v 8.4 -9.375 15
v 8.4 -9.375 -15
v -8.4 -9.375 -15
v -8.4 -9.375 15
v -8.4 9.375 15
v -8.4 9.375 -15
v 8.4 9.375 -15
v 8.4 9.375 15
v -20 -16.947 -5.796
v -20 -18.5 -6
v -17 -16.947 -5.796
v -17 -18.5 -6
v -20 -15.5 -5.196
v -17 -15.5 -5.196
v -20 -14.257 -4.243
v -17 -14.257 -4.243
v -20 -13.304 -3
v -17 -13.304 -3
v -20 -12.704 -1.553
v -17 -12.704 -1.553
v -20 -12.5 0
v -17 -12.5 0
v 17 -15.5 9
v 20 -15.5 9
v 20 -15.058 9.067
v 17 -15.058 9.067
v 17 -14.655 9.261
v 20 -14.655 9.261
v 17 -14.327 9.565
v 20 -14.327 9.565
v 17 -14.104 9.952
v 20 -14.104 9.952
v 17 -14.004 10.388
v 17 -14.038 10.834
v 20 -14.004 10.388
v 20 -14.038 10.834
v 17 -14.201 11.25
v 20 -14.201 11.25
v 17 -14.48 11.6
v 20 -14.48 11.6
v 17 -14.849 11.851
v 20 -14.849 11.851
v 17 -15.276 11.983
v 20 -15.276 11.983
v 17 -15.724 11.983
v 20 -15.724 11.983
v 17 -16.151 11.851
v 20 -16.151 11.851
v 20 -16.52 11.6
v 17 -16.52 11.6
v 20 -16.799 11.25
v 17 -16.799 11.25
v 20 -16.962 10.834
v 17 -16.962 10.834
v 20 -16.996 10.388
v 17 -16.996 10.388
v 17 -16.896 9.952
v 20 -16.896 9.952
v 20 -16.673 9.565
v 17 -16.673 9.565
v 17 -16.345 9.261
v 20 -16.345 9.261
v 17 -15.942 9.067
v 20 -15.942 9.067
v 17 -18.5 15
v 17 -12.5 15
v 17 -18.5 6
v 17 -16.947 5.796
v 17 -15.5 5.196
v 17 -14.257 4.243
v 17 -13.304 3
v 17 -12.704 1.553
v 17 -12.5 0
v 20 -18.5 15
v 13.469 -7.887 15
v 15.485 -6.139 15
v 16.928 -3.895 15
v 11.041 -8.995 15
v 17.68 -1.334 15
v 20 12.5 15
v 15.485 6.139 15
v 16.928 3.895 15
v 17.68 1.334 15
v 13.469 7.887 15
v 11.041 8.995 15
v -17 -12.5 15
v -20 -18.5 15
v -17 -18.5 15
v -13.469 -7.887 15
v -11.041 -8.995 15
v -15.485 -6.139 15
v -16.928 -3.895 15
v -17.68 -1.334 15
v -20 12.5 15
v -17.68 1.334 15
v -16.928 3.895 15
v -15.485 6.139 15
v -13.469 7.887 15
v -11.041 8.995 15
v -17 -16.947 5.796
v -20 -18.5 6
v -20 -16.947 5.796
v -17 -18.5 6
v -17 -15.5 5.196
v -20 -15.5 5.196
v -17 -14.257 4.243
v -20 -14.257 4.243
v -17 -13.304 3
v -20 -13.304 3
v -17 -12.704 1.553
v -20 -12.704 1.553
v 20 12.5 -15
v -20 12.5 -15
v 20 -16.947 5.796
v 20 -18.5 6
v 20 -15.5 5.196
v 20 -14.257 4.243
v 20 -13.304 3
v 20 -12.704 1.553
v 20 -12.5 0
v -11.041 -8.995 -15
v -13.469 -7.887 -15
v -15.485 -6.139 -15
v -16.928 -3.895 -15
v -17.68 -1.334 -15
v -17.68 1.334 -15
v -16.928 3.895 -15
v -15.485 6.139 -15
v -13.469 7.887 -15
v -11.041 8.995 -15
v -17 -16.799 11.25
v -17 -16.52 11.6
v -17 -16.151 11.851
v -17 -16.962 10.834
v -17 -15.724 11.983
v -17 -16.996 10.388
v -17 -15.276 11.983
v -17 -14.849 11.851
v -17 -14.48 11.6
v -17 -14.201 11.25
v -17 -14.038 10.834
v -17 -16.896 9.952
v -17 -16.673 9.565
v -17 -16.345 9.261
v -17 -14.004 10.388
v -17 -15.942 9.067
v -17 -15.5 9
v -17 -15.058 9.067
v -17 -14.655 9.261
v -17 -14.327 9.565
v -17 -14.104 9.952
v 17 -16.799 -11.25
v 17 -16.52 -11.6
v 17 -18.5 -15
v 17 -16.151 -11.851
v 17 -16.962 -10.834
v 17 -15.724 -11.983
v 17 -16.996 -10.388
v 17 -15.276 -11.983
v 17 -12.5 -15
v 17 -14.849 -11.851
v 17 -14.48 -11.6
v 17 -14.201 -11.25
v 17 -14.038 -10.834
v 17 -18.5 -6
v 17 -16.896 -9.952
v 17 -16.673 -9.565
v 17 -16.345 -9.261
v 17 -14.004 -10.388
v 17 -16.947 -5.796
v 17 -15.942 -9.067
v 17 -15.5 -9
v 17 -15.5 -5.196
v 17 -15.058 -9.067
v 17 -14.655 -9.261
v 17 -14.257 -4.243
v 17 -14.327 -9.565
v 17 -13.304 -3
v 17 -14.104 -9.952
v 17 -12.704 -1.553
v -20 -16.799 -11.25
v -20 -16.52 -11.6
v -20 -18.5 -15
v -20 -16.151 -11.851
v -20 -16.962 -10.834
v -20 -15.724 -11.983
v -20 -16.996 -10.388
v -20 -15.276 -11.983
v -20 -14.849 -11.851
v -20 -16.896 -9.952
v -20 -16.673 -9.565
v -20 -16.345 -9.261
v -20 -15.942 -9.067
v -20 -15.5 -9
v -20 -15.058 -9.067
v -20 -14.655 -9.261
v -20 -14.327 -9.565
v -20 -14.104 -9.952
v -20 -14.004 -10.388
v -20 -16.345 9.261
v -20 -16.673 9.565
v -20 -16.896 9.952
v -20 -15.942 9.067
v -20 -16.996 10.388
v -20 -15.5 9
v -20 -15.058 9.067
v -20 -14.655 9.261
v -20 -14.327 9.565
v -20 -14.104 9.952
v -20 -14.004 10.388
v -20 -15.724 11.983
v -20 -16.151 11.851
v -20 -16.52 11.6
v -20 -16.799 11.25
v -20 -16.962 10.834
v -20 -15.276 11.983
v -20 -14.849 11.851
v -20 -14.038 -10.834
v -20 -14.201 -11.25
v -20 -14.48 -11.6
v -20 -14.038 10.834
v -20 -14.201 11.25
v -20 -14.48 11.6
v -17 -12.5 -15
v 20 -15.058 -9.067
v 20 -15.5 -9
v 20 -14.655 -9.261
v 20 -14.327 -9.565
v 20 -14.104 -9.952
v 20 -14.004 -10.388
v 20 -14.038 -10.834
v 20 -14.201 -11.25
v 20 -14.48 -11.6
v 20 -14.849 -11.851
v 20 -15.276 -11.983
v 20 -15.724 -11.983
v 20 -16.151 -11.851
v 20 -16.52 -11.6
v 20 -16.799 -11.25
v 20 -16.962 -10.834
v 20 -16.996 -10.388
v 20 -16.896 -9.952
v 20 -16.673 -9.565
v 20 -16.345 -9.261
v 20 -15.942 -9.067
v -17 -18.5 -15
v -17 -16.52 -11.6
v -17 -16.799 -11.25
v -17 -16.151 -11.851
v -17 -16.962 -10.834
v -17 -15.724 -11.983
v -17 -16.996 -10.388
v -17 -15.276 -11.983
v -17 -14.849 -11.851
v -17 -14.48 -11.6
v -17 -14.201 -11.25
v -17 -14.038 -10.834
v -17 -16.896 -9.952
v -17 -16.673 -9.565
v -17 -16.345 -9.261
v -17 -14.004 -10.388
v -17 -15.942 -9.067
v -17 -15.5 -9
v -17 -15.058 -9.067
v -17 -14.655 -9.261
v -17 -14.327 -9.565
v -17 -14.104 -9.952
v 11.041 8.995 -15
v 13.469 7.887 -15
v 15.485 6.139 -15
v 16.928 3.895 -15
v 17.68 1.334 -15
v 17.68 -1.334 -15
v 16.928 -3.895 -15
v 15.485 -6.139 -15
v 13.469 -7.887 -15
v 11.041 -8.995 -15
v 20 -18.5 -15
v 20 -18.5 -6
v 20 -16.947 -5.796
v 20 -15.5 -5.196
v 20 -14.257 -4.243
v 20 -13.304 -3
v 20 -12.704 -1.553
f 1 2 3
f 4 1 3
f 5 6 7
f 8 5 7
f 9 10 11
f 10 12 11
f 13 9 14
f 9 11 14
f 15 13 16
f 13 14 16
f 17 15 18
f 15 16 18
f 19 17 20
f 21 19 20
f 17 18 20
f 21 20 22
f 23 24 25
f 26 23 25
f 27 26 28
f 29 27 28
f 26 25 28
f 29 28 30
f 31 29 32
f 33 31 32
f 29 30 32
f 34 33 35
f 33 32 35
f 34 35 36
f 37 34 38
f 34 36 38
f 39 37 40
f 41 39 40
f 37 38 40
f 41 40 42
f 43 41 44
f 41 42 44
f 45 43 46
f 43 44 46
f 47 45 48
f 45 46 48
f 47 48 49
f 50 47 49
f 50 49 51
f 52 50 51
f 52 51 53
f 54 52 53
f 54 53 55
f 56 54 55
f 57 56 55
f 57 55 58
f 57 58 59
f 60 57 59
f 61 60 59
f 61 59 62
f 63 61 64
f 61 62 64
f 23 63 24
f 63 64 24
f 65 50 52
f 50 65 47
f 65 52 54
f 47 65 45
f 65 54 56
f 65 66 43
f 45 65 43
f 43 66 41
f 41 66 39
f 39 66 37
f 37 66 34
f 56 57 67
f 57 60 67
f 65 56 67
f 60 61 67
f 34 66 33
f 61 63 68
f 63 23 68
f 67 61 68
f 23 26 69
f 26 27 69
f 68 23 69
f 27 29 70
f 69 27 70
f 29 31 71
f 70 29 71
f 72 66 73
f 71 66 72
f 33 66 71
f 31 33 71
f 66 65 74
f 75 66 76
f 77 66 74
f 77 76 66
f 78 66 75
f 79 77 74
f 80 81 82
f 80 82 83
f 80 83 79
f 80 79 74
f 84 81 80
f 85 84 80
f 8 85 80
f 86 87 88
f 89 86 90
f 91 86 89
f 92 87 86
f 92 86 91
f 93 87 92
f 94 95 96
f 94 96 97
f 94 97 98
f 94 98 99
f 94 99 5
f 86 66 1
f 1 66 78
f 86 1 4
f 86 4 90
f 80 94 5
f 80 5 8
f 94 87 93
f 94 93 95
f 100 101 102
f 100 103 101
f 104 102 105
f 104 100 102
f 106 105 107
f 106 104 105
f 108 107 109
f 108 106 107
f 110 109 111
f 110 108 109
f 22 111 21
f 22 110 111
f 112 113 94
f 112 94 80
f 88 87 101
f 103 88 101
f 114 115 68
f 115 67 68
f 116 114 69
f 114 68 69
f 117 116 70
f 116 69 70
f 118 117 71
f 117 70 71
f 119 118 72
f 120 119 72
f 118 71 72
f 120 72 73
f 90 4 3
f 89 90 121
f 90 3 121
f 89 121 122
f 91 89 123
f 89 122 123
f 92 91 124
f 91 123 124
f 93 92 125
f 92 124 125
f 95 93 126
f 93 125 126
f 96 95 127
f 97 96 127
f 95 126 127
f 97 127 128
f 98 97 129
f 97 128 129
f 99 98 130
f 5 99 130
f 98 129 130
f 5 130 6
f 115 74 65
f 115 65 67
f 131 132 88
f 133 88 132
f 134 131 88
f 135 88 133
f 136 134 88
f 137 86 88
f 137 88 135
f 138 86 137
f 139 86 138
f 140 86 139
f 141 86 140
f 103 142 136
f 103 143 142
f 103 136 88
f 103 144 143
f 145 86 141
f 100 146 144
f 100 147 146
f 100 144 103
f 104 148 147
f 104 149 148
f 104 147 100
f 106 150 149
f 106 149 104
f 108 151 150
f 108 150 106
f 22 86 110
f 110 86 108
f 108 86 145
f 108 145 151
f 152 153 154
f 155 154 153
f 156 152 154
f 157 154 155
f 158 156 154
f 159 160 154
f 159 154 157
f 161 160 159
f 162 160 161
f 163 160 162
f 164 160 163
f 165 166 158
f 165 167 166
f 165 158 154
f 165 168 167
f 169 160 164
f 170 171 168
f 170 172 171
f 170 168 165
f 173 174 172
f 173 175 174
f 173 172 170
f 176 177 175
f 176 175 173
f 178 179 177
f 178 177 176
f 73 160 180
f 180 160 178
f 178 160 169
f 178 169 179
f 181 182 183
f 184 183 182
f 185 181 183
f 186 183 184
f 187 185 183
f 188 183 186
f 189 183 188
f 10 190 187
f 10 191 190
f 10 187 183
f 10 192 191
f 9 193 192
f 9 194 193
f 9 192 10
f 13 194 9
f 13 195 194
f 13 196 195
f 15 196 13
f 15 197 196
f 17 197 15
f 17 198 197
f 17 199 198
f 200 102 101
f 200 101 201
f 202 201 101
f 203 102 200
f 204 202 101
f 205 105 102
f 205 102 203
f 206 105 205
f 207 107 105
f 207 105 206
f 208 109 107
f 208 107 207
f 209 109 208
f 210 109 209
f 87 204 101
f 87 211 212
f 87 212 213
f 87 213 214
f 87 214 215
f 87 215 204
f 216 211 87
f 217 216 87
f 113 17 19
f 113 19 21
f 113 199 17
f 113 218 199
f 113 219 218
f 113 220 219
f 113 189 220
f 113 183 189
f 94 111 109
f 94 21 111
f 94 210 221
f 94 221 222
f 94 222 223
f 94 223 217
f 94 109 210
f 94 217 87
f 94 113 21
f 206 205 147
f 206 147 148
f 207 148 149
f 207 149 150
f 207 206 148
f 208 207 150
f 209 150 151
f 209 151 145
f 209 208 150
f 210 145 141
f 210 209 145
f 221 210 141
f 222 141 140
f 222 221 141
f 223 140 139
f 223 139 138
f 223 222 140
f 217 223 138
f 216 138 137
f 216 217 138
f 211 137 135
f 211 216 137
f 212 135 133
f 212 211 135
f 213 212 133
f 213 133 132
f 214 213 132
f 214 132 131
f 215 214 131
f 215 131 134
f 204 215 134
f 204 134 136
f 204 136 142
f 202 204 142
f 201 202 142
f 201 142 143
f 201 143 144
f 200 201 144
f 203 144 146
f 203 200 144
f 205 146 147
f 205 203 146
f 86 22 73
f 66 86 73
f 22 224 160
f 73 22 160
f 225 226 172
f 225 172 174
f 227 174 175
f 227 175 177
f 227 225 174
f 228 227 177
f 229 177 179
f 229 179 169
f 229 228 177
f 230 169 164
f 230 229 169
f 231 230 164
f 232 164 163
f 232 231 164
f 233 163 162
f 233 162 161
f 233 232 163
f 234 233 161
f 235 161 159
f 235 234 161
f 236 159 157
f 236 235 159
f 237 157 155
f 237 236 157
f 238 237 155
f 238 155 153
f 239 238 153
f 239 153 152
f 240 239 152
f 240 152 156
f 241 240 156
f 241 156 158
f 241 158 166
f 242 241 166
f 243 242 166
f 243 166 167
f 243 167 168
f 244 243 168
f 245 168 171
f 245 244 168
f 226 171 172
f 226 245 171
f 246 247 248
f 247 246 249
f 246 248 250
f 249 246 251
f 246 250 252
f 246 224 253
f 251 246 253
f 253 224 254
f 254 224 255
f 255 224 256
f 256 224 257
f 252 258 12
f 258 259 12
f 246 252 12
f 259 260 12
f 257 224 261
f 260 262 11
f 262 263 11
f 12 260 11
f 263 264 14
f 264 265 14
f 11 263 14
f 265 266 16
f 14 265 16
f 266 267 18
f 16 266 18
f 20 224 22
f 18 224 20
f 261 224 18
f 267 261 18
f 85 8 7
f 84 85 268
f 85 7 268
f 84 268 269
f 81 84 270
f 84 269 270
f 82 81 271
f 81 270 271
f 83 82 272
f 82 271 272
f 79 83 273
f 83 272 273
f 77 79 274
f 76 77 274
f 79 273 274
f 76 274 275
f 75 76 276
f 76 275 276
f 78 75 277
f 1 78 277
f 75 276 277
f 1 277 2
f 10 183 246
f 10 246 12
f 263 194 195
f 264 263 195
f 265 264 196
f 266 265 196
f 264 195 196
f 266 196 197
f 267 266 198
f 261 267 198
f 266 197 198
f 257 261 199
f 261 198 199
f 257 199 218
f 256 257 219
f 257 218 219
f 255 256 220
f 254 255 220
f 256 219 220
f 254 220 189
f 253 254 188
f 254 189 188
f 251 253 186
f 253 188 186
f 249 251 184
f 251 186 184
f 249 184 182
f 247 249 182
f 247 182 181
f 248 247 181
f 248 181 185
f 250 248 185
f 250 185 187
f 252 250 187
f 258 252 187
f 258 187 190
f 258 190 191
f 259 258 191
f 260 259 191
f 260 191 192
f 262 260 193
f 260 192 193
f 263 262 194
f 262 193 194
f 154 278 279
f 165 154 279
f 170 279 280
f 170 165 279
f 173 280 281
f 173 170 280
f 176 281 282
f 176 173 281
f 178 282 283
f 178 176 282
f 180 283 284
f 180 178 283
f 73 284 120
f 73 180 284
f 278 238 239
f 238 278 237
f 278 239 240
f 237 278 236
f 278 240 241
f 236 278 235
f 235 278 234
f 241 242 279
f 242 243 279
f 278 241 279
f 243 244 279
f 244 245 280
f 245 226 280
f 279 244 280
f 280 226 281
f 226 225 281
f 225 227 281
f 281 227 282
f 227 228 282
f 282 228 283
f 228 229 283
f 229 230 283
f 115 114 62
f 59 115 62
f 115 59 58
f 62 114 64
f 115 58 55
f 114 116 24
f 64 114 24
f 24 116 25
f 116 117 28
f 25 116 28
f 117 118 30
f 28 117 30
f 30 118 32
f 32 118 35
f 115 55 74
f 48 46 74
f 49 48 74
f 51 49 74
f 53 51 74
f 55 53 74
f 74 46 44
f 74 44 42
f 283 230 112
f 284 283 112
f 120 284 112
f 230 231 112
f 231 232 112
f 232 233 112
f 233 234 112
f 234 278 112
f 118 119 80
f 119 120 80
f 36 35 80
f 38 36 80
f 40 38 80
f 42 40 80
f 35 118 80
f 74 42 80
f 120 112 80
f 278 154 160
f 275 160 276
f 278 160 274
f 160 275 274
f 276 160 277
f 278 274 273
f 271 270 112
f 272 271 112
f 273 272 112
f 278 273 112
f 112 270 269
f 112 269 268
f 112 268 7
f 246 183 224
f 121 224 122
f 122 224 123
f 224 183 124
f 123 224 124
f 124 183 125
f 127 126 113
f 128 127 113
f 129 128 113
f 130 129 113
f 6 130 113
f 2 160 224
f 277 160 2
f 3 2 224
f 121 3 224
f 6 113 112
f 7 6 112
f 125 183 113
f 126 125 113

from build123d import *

# Parameters (mm, degrees)
BOSS_EXTRUDE1_DEPTH      = 15
BOSS_EXTRUDE1_DEPTH_BACK = 15
SKETCH1_W                = 40
SKETCH1_H                = 25
SKETCH2_W                = 9
SKETCH2_H                = 6
SKETCH2_R                = 1.5
BOSS_EXTRUDE2_DEPTH      = 3
MIRROR3_COPY_1_SKETCH_W  = 9
MIRROR3_COPY_1_SKETCH_H  = 6
MIRROR3_COPY_1_SKETCH_R  = 1.5
MIRROR3_COPY_1_DEPTH     = 3
FILLET1_R                = 6


with BuildPart() as part:
    # Sketch1 → Boss-Extrude1 (new, two sides: drawn at the far end of the back side and taken through both)
    with BuildSketch(Plane.XY.offset(-BOSS_EXTRUDE1_DEPTH_BACK)):
        Rectangle(SKETCH1_W, SKETCH1_H)
        with BuildLine():
            Line((-8.4, 9.375), (8.4, 9.375))
            ThreePointArc((8.4, 9.375), (17.775, 0), (8.4, -9.375))
            Line((8.4, -9.375), (-8.4, -9.375))
            ThreePointArc((-8.4, -9.375), (-17.775, 0), (-8.4, 9.375))
        make_face(mode=Mode.SUBTRACT)
    extrude(amount=BOSS_EXTRUDE1_DEPTH + BOSS_EXTRUDE1_DEPTH_BACK)

    # Sketch2 → Boss-Extrude2 (add)
    with BuildSketch(Plane(origin=(20, 0, 0), x_dir=(0, 0, -1), z_dir=(1, 0, 0))):
        with Locations((-10.5, -15.5)):
            Rectangle(SKETCH2_W, SKETCH2_H)
        with Locations((-10.5, -15.5)):
            Circle(SKETCH2_R, mode=Mode.SUBTRACT)
    boss_extrude2 = extrude(amount=-BOSS_EXTRUDE2_DEPTH)

    # Mirror1: Boss-Extrude2 across plane
    add(boss_extrude2.mirror(Plane.XY))

    # Mirror3: Boss-Extrude2 across plane
    add(boss_extrude2.mirror(Plane(origin=(0, 0, 0), x_dir=(0, 0, 1), z_dir=(1, 0, 0))))

    # Mirror3 copy 1 sketch → Mirror3 copy 1 (add)
    with BuildSketch(Plane.ZY.offset(20)):
        with Locations((-10.5, -15.5)):
            Rectangle(MIRROR3_COPY_1_SKETCH_W, MIRROR3_COPY_1_SKETCH_H)
        with Locations((-10.5, -15.5)):
            Circle(MIRROR3_COPY_1_SKETCH_R, mode=Mode.SUBTRACT)
    extrude(amount=-MIRROR3_COPY_1_DEPTH)

    # Fillet1
    fillet1_edges = [part.edges().sort_by_distance(p)[0] for p in [
        (-18.5, -12.5, -6),
        (-18.5, -12.5, 6),
        (18.5, -12.5, -6),
        (18.5, -12.5, 6),
    ]]
    fillet(fillet1_edges, radius=FILLET1_R - 0.0001)  # a hair under: the kernel refuses the full size


solid = part.part
